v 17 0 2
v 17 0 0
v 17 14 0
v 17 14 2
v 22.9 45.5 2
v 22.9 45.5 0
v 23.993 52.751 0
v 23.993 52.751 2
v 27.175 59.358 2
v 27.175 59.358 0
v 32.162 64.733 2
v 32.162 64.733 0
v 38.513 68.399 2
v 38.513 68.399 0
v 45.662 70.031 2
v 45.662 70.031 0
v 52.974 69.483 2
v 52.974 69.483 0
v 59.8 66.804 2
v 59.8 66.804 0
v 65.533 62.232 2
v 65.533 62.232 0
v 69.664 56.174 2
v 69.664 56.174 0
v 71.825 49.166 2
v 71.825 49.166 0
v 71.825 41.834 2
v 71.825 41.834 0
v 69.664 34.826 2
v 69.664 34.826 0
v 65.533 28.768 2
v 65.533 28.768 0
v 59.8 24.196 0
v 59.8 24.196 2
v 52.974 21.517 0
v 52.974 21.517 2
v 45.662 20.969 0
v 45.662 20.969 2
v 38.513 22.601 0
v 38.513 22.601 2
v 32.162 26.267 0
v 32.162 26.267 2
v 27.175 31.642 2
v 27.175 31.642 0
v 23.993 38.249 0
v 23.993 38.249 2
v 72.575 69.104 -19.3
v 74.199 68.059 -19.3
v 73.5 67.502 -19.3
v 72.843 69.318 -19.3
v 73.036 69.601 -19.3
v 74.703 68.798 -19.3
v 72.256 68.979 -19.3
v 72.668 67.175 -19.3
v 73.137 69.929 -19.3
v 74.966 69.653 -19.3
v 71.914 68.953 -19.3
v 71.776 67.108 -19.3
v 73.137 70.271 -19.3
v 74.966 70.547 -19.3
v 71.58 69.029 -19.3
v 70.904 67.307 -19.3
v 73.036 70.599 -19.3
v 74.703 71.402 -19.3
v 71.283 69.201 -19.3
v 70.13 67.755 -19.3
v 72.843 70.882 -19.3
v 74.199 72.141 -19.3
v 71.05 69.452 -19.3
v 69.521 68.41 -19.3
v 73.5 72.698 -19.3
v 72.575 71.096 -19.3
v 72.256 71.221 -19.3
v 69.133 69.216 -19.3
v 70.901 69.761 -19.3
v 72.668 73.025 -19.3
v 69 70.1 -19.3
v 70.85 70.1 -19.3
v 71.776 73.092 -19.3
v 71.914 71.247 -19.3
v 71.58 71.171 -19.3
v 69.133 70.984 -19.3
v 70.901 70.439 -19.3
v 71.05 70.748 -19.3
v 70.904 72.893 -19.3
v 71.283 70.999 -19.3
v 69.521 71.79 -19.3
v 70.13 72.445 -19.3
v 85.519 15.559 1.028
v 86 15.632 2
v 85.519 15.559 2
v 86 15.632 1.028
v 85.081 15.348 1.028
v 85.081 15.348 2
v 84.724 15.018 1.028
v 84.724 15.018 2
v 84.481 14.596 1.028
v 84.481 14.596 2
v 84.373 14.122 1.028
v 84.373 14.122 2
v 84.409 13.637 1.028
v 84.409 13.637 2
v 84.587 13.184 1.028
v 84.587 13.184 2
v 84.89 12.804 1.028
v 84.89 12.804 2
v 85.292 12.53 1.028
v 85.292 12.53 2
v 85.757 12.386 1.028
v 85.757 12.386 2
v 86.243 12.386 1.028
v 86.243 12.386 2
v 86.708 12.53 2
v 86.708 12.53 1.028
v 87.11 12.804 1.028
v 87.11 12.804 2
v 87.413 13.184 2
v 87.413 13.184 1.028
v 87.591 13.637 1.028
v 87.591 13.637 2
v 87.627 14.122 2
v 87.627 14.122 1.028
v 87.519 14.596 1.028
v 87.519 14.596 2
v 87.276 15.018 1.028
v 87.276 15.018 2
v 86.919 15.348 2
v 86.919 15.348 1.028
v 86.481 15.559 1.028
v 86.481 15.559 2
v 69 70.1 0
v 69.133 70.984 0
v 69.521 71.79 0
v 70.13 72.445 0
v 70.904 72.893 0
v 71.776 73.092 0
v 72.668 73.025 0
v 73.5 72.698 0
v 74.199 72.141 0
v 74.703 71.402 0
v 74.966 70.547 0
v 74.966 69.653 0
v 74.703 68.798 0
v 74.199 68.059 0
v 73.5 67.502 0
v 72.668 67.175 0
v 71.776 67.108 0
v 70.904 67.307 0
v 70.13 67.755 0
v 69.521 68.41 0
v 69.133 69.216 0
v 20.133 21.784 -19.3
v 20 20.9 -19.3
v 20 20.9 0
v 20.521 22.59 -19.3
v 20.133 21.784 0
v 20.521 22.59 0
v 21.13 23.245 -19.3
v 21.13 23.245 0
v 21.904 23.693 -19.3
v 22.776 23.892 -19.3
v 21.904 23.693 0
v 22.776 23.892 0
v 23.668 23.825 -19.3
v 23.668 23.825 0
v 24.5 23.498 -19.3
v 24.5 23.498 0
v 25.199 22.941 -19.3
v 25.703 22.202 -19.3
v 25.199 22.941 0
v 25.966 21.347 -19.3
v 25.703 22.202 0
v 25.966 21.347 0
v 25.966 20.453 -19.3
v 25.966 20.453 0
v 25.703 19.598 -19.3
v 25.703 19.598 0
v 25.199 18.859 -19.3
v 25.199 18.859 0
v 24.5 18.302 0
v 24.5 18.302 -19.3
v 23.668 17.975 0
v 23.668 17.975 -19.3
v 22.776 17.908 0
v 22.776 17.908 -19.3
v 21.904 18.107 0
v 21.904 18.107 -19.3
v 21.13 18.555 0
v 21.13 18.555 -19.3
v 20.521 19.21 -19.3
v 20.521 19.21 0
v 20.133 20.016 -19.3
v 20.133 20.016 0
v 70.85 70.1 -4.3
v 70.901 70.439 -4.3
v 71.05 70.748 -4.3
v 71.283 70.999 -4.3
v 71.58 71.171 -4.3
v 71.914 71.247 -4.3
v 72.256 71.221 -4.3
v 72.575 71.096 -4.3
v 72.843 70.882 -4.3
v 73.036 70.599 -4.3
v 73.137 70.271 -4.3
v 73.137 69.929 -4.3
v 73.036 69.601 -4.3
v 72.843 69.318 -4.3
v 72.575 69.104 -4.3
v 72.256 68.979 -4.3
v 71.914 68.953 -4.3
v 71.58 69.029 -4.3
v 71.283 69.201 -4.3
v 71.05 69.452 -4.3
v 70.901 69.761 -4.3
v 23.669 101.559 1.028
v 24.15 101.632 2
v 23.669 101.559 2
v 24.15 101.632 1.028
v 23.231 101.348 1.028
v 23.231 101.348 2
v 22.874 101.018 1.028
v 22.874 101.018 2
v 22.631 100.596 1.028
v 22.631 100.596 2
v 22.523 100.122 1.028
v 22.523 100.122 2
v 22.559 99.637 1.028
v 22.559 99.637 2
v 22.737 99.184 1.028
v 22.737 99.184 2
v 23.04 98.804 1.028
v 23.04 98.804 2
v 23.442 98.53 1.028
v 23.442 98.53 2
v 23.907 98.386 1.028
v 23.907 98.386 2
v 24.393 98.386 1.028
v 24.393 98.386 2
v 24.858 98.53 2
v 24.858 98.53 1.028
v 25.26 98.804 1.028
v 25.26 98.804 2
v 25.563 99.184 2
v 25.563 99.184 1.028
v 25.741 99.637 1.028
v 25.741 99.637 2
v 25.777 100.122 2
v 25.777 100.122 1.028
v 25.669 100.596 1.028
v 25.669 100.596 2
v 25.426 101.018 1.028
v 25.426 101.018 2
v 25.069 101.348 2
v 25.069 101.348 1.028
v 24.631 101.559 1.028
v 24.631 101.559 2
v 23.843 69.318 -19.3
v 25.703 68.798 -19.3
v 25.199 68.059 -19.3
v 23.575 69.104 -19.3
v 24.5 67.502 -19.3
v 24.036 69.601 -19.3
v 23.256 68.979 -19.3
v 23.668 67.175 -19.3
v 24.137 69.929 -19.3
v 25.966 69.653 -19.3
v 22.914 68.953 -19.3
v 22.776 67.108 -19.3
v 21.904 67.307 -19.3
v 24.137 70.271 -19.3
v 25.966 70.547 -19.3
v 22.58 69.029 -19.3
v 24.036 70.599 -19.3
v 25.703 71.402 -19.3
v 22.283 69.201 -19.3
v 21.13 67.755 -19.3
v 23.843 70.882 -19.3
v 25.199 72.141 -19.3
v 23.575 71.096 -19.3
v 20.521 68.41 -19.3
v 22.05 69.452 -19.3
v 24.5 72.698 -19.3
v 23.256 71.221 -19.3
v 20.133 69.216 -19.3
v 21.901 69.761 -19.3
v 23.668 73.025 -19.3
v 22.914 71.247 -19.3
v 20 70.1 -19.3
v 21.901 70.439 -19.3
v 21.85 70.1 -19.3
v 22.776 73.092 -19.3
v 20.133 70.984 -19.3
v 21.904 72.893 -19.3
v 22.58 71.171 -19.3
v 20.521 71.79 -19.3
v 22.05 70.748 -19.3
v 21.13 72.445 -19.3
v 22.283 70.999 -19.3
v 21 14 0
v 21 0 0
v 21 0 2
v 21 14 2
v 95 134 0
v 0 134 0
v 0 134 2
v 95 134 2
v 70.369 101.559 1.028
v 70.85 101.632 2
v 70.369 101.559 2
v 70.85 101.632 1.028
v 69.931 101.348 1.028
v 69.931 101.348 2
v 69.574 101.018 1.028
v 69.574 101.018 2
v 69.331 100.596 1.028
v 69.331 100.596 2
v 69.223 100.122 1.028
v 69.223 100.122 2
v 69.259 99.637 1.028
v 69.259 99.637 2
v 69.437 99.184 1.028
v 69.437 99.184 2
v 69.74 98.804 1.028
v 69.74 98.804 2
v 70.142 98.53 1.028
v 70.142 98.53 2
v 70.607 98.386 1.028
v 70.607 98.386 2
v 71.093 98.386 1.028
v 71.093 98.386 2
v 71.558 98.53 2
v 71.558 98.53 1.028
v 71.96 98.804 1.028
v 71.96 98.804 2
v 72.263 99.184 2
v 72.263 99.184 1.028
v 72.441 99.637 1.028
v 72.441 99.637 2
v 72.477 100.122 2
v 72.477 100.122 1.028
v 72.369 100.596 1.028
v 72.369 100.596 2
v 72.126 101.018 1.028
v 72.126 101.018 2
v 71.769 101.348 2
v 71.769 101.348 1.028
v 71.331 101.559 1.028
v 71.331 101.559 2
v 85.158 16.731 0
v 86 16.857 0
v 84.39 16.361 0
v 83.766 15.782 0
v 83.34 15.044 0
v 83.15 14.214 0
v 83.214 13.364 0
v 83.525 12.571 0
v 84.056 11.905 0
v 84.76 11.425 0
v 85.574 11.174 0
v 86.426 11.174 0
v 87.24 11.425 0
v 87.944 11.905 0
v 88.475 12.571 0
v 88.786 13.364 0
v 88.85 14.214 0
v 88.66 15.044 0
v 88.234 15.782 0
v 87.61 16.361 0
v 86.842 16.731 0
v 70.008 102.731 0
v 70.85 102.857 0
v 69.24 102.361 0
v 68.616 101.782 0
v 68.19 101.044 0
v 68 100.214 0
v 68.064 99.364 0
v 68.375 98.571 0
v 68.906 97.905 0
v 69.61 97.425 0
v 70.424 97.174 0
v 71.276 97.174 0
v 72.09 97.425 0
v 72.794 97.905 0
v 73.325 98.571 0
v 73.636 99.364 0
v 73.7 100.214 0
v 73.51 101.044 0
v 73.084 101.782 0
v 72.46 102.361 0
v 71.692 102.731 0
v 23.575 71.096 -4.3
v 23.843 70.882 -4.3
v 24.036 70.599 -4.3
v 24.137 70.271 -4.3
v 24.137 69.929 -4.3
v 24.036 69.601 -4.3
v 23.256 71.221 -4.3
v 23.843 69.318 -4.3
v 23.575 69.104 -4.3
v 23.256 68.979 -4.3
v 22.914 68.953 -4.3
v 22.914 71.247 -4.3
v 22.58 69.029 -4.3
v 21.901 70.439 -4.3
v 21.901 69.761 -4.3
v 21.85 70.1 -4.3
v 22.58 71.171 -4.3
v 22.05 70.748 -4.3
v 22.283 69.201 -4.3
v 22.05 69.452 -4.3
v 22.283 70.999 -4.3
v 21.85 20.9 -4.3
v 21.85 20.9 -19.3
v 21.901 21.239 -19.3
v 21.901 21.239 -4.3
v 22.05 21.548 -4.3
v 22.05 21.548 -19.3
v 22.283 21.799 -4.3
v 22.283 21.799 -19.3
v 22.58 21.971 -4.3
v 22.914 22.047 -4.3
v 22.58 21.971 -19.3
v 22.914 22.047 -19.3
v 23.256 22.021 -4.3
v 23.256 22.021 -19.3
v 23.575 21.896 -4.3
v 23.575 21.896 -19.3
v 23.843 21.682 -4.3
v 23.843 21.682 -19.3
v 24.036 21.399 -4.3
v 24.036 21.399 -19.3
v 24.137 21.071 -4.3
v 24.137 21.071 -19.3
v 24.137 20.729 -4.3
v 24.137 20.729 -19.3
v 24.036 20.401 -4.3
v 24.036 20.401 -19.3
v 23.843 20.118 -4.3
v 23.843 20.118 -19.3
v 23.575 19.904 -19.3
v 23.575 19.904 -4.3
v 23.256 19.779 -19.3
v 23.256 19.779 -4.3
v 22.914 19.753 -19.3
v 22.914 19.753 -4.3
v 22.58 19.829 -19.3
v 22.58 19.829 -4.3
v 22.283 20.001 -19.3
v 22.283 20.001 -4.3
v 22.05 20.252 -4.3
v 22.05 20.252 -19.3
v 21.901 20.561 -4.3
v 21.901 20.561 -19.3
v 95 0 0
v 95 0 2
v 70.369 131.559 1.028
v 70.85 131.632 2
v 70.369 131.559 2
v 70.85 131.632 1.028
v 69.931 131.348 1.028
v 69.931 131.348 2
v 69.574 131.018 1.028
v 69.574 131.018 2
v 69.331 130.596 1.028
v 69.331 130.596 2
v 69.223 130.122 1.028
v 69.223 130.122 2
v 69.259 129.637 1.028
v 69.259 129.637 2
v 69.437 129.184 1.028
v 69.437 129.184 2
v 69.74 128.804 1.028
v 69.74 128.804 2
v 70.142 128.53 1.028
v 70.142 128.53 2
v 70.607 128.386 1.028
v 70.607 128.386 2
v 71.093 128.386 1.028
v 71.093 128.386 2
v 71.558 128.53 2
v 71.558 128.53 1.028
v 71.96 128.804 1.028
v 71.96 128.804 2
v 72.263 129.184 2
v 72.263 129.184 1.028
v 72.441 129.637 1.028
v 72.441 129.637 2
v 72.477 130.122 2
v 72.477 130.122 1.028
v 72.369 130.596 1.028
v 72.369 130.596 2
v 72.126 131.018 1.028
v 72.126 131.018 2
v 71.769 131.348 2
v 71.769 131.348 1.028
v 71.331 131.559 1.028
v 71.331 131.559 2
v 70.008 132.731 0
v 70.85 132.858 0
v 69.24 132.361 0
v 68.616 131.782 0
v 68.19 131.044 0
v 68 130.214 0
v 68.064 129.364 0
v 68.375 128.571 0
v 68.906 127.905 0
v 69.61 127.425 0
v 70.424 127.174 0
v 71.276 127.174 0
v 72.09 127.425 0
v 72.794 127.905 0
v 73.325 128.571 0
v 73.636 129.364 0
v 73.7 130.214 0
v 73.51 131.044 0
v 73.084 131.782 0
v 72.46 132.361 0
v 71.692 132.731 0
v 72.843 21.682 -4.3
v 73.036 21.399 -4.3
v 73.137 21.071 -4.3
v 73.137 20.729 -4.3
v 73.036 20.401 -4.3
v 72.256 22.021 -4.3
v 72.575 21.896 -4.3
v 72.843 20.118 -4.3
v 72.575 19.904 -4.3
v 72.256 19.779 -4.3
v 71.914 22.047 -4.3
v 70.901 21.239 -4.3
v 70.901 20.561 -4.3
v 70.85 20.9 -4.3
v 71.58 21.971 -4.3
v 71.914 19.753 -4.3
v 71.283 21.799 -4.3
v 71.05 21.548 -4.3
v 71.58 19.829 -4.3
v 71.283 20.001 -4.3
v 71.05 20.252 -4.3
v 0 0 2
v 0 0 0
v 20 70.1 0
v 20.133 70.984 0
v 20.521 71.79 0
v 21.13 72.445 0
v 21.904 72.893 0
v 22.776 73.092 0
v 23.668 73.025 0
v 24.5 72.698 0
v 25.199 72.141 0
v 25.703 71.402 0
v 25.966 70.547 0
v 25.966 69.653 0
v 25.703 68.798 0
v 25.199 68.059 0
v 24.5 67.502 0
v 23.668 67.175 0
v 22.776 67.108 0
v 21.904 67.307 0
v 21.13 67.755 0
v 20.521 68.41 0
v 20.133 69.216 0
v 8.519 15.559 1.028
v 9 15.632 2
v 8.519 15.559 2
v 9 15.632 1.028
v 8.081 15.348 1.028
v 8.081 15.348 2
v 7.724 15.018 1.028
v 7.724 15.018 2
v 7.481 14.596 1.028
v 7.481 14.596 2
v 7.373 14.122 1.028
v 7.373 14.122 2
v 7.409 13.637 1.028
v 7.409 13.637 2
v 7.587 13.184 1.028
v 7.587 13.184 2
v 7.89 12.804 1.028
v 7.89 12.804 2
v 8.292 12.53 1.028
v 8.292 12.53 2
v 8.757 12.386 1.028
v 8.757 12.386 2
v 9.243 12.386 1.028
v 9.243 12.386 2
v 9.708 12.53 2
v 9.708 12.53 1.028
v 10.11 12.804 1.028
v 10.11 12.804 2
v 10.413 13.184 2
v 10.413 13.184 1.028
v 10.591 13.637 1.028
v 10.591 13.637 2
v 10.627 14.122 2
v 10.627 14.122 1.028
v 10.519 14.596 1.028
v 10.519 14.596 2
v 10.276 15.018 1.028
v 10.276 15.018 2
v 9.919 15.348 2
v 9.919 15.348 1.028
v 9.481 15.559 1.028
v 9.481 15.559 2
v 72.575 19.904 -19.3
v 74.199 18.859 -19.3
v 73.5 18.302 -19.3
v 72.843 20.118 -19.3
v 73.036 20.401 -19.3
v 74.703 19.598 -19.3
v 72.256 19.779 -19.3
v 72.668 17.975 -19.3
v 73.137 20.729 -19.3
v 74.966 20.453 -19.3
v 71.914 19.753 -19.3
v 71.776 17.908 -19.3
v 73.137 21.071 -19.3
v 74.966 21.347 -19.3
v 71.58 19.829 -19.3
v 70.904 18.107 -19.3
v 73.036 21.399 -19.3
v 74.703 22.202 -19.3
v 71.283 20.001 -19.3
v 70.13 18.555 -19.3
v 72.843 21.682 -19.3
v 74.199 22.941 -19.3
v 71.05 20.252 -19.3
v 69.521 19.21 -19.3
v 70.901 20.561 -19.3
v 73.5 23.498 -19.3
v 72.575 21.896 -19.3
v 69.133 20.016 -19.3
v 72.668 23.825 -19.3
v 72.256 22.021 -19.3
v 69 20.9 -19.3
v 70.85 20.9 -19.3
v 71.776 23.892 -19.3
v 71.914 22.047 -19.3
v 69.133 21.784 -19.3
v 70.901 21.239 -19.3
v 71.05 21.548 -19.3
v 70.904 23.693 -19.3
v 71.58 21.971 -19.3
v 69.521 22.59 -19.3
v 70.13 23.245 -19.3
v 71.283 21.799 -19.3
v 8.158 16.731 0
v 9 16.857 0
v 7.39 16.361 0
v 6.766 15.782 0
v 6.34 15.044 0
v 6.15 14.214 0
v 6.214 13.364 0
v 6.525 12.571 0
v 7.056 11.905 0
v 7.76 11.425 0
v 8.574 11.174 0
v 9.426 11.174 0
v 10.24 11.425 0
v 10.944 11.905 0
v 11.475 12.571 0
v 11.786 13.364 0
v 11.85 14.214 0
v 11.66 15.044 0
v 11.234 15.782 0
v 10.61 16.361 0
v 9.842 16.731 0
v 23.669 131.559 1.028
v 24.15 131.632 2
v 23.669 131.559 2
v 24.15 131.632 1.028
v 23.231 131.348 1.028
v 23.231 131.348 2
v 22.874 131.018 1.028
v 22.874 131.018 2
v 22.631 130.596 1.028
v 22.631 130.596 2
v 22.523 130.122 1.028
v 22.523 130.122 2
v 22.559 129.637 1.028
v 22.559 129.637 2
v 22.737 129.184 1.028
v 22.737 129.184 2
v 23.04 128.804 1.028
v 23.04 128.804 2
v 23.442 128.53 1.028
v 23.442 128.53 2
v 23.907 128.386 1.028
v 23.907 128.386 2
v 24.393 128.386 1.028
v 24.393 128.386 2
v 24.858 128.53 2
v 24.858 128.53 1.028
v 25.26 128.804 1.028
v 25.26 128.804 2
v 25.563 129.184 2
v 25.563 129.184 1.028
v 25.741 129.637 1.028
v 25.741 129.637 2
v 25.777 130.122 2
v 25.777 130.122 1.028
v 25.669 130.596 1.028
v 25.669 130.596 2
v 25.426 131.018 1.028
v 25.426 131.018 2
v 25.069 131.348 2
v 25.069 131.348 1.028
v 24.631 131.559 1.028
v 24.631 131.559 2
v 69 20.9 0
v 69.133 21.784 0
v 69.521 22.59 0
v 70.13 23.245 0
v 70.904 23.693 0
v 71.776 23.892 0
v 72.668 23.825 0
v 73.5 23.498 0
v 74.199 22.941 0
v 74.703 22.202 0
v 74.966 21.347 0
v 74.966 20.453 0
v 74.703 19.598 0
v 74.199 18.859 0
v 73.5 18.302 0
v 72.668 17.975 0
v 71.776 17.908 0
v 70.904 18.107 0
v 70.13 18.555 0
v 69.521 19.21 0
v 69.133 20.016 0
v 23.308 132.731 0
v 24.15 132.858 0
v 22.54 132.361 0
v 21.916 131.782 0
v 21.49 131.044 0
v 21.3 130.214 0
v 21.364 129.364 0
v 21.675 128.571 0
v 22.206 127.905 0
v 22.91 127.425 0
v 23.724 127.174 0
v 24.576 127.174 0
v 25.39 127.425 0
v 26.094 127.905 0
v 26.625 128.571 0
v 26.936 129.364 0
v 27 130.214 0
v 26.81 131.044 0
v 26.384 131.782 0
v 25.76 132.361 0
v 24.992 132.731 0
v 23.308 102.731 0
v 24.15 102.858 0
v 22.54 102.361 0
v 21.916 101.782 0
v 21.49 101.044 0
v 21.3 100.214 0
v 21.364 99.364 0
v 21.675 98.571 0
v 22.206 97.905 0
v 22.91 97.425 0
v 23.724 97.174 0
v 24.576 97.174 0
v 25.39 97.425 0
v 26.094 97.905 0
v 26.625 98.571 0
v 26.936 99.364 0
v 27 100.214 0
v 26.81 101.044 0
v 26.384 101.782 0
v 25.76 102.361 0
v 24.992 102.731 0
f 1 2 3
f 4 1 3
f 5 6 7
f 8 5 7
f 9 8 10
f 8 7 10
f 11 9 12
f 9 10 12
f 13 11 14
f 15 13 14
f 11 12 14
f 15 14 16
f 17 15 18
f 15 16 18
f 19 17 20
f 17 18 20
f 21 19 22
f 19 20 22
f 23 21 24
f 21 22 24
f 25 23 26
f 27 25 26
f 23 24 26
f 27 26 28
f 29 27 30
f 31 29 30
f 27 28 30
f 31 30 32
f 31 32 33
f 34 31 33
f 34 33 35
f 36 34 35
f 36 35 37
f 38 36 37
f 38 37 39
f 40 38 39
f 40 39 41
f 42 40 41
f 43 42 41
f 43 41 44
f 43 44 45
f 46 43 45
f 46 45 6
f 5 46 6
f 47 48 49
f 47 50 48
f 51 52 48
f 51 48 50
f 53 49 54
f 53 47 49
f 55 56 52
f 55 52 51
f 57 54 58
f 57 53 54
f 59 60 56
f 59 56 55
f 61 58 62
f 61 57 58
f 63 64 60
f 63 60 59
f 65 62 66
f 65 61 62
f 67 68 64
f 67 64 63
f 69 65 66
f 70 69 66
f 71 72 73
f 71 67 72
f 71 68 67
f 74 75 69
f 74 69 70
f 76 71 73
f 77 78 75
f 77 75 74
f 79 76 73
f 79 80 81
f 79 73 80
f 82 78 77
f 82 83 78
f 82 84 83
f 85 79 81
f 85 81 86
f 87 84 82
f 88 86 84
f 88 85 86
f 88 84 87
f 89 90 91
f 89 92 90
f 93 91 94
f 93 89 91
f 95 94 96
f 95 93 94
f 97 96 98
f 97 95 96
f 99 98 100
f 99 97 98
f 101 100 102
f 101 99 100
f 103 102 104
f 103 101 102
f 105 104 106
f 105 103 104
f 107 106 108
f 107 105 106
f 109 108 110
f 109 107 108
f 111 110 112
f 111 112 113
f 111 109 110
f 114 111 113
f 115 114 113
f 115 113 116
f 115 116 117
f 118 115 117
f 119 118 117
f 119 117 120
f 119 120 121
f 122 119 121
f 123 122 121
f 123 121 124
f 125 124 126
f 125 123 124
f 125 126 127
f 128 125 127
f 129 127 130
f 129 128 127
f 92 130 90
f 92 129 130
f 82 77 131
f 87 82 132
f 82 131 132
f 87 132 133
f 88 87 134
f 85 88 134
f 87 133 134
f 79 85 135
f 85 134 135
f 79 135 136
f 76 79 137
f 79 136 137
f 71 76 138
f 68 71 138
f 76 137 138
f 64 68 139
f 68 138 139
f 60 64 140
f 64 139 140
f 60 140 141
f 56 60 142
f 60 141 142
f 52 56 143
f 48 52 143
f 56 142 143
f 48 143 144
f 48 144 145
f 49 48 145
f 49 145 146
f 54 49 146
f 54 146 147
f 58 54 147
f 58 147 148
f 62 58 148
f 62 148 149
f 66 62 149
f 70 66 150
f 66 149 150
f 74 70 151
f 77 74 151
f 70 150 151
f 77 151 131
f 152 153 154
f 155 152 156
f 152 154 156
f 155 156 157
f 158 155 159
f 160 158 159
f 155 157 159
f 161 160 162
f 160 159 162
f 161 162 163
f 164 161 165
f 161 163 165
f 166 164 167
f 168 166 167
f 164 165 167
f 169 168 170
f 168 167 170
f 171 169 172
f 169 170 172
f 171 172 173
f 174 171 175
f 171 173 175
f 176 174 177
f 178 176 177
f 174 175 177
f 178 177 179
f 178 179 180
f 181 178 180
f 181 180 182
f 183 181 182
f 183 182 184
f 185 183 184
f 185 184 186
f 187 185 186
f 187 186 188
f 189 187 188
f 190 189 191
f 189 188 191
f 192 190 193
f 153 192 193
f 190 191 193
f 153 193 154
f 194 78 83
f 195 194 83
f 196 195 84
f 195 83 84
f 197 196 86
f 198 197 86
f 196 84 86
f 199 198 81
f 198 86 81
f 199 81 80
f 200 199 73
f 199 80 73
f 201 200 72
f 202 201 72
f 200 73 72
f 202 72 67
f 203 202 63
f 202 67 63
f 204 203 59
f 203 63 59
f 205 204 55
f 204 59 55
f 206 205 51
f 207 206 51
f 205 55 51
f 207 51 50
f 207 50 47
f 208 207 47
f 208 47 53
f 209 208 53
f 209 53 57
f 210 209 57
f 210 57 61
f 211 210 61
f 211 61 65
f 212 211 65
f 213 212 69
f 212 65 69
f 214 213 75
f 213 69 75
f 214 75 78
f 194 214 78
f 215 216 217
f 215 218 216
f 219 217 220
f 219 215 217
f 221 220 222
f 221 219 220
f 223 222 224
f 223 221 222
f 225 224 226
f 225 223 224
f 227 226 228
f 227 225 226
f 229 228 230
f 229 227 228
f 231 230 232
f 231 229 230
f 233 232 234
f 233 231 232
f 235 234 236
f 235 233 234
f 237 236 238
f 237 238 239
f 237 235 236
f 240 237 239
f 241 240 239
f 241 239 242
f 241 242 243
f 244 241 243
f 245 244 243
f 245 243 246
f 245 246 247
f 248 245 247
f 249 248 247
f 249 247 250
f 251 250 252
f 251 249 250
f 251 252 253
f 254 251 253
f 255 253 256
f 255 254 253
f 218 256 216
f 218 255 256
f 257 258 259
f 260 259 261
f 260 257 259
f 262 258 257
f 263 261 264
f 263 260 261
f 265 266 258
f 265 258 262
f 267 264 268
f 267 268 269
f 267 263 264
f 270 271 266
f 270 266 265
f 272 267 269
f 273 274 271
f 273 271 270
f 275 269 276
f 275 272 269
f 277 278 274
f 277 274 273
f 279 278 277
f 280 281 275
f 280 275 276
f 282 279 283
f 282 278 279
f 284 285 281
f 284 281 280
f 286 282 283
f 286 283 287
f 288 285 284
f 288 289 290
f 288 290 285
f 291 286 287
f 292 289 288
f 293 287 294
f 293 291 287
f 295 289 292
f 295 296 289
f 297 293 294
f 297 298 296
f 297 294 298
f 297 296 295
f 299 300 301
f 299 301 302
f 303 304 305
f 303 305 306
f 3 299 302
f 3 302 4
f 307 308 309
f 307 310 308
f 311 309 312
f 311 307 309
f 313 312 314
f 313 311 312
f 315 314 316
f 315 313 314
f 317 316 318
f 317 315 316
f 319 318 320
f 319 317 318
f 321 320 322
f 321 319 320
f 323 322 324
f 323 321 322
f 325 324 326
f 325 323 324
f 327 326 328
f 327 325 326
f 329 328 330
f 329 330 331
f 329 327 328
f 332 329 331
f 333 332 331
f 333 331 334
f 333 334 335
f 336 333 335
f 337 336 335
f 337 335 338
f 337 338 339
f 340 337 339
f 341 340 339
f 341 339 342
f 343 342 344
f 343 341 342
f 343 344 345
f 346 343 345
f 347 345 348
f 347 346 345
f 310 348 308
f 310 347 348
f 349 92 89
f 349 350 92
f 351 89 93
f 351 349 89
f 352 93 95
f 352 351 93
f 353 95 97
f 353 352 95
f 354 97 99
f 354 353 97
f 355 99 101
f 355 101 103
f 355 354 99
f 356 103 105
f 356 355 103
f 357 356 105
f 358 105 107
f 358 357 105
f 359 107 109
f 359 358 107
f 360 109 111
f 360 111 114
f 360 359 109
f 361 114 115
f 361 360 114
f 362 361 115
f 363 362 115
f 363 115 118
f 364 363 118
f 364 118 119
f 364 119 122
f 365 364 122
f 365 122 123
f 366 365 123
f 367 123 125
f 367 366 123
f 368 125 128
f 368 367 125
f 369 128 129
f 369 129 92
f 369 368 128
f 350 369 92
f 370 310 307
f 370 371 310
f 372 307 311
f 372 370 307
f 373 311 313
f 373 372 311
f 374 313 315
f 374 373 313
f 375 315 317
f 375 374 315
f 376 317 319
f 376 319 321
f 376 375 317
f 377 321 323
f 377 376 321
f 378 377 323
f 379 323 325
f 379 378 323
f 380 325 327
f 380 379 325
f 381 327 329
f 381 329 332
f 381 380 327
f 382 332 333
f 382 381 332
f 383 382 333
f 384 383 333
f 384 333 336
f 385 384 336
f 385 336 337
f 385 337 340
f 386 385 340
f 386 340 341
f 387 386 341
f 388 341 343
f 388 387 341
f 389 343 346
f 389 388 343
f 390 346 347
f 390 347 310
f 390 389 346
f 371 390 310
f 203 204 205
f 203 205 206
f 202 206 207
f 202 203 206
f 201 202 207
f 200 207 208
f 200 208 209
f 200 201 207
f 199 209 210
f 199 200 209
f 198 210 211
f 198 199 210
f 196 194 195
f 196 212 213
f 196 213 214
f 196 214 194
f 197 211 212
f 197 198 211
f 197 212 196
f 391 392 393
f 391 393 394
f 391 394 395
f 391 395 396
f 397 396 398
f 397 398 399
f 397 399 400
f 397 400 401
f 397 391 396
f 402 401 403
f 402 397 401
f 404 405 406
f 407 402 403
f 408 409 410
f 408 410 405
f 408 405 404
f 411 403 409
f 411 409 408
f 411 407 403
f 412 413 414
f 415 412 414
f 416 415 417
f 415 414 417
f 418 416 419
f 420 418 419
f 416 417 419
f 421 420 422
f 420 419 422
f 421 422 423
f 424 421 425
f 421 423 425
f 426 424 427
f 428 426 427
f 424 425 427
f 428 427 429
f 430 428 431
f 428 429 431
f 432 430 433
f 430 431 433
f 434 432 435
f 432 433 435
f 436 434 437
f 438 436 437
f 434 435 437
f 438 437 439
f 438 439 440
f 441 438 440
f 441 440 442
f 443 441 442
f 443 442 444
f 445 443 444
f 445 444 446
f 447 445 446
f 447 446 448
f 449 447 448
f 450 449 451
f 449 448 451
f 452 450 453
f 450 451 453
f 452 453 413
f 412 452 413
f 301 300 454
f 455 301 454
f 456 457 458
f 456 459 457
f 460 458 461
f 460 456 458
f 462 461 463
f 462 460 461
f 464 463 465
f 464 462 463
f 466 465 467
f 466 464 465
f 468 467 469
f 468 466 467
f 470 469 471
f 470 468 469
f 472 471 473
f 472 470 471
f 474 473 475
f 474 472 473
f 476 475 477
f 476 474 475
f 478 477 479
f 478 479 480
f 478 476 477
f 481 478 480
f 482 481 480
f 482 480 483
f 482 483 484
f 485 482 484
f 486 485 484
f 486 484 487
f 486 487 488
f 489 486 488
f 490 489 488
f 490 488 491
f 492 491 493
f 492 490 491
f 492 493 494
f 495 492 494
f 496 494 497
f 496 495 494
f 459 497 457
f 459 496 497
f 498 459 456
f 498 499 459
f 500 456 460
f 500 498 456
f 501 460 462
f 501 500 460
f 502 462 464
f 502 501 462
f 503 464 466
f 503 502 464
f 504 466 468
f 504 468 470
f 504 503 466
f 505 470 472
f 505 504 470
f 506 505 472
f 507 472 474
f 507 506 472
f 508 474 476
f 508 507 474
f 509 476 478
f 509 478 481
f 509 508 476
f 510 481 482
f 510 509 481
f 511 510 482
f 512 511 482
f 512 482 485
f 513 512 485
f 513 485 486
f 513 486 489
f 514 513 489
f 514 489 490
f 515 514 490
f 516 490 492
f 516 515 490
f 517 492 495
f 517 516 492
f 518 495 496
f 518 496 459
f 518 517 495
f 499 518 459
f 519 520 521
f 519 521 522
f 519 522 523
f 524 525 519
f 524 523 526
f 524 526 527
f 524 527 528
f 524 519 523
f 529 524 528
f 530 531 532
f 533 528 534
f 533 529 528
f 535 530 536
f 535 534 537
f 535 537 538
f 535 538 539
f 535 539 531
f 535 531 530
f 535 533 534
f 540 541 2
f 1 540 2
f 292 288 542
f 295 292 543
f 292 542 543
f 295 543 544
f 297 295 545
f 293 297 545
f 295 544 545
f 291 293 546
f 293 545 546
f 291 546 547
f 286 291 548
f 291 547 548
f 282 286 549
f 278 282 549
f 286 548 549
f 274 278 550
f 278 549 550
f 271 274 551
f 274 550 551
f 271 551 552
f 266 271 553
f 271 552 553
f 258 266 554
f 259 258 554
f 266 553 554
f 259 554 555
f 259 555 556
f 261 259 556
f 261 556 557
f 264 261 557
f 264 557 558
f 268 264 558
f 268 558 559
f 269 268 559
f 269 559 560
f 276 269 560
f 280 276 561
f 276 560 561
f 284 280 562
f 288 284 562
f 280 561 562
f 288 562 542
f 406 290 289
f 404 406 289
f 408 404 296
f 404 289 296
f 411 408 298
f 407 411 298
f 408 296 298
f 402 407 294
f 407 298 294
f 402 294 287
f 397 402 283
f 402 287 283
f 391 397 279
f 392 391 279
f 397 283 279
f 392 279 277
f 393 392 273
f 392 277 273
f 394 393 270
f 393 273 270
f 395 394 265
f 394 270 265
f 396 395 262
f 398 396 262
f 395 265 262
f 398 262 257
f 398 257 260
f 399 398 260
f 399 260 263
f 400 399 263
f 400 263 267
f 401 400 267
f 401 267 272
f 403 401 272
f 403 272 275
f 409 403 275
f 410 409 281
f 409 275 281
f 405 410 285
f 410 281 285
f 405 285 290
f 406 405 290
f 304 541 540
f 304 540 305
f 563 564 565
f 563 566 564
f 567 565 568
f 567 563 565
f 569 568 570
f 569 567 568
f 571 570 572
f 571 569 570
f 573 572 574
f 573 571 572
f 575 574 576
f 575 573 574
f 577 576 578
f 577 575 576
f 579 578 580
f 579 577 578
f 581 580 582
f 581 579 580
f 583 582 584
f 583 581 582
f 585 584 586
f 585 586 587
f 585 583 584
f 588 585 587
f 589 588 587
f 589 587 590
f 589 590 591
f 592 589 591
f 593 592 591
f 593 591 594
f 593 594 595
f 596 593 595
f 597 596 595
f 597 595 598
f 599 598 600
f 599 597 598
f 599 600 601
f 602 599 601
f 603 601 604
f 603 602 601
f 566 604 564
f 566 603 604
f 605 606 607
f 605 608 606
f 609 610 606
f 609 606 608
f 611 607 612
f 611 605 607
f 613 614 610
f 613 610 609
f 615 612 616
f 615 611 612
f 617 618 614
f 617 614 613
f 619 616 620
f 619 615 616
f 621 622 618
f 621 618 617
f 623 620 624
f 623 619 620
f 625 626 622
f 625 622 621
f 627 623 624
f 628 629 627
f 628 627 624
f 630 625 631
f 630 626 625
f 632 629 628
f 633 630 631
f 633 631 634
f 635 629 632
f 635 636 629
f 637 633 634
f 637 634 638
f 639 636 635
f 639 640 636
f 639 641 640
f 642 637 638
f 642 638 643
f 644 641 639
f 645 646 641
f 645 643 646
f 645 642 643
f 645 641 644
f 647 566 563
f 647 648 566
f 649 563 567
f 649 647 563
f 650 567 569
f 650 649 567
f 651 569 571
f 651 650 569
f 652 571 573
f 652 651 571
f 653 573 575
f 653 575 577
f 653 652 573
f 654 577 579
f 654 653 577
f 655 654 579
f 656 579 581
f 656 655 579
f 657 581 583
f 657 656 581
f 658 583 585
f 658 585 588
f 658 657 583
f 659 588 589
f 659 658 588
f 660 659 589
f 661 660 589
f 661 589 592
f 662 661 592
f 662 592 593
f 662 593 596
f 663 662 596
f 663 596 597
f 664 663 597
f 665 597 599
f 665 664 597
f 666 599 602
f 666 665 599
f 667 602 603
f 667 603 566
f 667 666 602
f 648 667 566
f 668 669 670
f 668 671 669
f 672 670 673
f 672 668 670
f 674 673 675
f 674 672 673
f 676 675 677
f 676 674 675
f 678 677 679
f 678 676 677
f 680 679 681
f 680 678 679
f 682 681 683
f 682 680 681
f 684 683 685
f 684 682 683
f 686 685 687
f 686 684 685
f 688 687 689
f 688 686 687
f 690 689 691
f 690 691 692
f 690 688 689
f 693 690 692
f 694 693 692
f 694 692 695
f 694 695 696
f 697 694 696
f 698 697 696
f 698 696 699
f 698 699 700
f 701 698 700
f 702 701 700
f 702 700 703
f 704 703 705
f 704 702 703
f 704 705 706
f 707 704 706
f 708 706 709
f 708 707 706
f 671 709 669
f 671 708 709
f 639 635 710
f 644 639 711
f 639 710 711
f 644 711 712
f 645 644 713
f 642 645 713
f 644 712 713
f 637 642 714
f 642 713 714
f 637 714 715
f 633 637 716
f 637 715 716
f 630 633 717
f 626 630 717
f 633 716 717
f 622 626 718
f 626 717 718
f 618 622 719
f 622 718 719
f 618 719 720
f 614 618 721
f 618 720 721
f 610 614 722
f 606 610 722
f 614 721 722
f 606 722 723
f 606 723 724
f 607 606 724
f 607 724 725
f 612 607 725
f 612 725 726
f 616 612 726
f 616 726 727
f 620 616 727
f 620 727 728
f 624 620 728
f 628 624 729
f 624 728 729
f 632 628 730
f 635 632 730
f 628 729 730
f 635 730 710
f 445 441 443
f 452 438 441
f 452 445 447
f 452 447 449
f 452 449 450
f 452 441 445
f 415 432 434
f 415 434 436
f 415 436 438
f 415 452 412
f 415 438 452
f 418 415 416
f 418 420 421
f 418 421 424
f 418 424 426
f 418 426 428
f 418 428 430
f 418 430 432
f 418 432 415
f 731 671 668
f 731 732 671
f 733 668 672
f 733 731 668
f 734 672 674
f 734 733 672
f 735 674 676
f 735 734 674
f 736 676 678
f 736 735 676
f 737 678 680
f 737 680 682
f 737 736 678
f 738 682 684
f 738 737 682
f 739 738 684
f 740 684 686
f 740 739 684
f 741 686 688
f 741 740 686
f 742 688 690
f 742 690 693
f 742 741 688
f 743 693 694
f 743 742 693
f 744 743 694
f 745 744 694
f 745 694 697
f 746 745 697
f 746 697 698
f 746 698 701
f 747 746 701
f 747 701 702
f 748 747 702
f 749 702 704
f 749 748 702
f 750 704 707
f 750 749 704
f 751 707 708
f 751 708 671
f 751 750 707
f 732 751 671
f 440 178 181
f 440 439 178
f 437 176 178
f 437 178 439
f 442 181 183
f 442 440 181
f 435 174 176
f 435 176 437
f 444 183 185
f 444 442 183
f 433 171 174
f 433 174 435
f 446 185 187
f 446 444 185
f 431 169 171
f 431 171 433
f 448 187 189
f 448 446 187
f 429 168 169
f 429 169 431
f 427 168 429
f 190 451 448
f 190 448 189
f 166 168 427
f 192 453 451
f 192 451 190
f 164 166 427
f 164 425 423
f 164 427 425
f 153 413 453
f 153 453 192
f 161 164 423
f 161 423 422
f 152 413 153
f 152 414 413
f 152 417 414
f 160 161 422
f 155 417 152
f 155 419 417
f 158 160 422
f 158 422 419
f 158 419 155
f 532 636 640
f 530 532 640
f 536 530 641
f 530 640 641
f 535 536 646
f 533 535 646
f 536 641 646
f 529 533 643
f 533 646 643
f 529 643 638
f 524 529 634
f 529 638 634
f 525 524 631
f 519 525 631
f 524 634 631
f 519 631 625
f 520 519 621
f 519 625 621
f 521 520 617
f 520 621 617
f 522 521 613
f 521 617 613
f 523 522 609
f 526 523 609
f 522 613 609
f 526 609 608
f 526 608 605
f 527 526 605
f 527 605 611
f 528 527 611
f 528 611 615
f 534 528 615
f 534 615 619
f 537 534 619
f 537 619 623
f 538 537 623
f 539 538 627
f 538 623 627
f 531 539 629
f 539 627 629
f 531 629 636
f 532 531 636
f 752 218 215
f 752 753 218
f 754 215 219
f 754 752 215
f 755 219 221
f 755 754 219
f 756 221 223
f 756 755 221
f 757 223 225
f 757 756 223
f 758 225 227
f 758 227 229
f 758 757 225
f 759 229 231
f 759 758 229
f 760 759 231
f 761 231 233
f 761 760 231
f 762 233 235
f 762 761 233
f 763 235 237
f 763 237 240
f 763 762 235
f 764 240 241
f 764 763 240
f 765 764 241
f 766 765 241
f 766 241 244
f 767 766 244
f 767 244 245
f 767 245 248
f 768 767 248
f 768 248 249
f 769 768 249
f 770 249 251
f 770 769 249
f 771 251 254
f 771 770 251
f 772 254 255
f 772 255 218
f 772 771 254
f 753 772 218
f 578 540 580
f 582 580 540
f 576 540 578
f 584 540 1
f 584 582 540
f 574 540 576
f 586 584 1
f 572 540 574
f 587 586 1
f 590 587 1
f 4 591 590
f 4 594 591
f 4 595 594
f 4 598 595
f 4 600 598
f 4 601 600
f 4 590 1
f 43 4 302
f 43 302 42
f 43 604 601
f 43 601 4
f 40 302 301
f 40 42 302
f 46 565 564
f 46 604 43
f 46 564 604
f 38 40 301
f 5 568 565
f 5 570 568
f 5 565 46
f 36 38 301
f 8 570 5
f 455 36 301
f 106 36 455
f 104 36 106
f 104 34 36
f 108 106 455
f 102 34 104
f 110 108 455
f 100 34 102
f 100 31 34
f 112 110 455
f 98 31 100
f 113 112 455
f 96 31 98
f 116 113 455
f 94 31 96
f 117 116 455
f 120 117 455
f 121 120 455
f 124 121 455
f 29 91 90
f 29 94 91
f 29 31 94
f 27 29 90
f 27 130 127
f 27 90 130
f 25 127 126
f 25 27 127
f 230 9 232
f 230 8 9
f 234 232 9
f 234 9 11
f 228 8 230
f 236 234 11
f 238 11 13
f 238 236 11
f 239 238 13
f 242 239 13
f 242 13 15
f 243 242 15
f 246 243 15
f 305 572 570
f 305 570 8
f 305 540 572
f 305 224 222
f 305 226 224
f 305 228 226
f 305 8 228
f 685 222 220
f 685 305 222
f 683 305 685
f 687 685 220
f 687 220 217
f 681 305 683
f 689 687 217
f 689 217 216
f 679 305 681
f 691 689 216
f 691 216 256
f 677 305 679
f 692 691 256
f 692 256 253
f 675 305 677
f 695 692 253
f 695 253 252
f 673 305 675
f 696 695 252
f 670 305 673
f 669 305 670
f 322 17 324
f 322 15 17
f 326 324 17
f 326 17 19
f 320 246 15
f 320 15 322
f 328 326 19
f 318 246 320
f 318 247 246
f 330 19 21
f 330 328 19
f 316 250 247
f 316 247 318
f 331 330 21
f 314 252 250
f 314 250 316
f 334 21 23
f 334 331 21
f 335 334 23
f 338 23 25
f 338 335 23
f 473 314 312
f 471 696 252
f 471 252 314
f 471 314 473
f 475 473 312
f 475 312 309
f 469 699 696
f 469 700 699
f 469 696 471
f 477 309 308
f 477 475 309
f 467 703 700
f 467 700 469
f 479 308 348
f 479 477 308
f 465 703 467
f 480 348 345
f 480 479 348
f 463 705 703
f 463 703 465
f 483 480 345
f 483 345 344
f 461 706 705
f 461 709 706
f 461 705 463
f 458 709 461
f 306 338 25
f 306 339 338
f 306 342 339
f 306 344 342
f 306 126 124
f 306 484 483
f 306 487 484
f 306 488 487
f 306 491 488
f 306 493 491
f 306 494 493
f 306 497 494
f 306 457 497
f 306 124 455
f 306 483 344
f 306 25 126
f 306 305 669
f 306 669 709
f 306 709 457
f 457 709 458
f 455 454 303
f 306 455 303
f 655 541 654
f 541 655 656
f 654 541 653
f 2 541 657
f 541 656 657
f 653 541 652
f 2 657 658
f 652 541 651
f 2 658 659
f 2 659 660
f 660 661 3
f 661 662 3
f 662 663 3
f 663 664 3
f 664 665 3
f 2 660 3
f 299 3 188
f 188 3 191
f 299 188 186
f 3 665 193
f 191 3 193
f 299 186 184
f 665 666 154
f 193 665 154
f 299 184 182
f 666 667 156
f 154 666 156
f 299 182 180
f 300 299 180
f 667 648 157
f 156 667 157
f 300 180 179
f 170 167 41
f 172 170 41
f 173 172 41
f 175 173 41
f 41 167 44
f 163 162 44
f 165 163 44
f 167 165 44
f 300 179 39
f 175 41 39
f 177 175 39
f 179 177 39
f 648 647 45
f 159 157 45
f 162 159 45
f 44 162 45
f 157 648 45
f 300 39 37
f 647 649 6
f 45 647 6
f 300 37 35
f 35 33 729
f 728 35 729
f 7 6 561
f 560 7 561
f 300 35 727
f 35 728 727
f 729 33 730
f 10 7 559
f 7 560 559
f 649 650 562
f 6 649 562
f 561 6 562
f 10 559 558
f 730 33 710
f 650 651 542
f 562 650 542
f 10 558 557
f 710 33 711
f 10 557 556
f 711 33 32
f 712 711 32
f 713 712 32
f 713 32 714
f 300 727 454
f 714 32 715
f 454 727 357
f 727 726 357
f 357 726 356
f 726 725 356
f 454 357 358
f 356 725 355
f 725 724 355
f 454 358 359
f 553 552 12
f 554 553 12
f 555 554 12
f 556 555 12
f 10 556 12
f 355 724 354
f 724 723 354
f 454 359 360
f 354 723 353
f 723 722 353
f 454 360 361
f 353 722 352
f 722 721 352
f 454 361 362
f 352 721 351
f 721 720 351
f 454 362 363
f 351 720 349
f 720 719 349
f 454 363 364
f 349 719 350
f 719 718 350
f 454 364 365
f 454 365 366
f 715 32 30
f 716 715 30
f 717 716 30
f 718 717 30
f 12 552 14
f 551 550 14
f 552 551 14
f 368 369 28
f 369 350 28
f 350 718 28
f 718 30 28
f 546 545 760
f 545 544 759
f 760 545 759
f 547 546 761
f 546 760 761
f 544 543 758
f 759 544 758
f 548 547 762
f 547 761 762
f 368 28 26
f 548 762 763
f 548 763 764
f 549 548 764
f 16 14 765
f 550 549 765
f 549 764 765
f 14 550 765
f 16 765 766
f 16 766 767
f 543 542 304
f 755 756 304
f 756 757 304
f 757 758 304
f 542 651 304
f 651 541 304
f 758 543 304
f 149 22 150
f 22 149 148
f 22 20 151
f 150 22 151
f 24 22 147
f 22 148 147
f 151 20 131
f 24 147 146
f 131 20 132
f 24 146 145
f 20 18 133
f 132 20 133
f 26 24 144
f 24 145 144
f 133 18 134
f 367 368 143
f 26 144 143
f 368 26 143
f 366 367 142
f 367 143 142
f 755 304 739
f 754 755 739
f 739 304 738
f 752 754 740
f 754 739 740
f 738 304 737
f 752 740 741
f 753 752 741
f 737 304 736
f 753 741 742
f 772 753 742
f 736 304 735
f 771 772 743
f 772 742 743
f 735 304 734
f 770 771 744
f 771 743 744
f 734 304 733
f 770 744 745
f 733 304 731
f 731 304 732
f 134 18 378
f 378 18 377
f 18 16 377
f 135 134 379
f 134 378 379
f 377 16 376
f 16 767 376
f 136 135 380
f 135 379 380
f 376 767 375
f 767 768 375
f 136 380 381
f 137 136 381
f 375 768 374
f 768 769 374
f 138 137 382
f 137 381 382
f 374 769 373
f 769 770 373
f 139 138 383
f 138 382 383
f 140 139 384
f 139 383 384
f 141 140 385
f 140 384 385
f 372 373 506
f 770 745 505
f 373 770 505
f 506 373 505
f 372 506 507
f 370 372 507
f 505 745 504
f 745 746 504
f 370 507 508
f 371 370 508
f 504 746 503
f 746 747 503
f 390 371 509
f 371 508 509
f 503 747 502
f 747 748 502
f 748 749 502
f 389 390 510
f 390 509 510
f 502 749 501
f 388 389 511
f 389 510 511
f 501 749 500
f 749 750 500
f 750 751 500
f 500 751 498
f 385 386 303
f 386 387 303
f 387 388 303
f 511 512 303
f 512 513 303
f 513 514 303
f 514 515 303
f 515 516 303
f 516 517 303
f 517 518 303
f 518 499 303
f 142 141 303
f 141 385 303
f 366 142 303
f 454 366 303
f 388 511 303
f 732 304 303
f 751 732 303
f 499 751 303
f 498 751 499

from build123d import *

# Parameters (mm, degrees)
SKETCH1_W                                 = 95
SKETCH1_H                                 = 134
BOSS_EXTRUDE1_DEPTH                       = 2
CSK_FOR_4_FLAT_HEAD_MACHINE_SCREW_2_COUNT = 2
CSK_FOR_4_FLAT_HEAD_MACHINE_SCREW_2_PITCH = 46.7
CSK_FOR_4_FLAT_HEAD_MACHINE_SCREW_3_COUNT = 2
CSK_FOR_4_FLAT_HEAD_MACHINE_SCREW_3_PITCH = 55.505765466
CSK_FOR_4_FLAT_HEAD_MACHINE_SCREW_4_COUNT = 2
CSK_FOR_4_FLAT_HEAD_MACHINE_SCREW_4_PITCH = 30
CSK_FOR_4_FLAT_HEAD_MACHINE_SCREW_5_COUNT = 2
CSK_FOR_4_FLAT_HEAD_MACHINE_SCREW_5_PITCH = 116.985137945
CSK_FOR_4_FLAT_HEAD_MACHINE_SCREW_6_COUNT = 2
CSK_FOR_4_FLAT_HEAD_MACHINE_SCREW_6_PITCH = 131.458824352
SKETCH13_R                                = 24.6
CUT_EXTRUDE2_DEPTH                        = 165.271117364
SKETCH14_R                                = 3
BOSS_EXTRUDE4_DEPTH                       = 19.3
SKETCH15_R                                = 1.15
CUT_EXTRUDE3_DEPTH                        = 15
SKETCH16_W                                = 4
SKETCH16_H                                = 14
CUT_EXTRUDE4_DEPTH                        = 166.388905311


with BuildPart() as part:
    # Sketch1 → Boss-Extrude1 (new body)
    with BuildSketch(Plane.XY):
        with Locations((47.5, 67)):
            Rectangle(SKETCH1_W, SKETCH1_H)
    extrude(amount=BOSS_EXTRUDE1_DEPTH)

    # Sketch8 → CSK for #4 Flat Head Machine Screw (100)2 (revolve, cut)
    with BuildSketch(Plane(origin=(70.85, 130, 0), x_dir=(0, 1, 0), z_dir=(1, 0, 0))):
        Polygon((0, 0), (0, 2), (1.63195, 2), (1.63195, 1.028358553), (2.8575, 0), align=None)
    csk_for_4_flat_head_machine_screw_100 = revolve(axis=Axis((70.85, 130, -6.35), (0, 0, 1)), mode=Mode.SUBTRACT)

    # CSK for _4 Flat Head Machine Screw _ 2: CSK for #4 Flat Head Machine Screw (100)2 ×2
    with Locations(*[(-i * CSK_FOR_4_FLAT_HEAD_MACHINE_SCREW_2_PITCH, 0, 0) for i in range(1, CSK_FOR_4_FLAT_HEAD_MACHINE_SCREW_2_COUNT)]):
        add(csk_for_4_flat_head_machine_screw_100, mode=Mode.SUBTRACT)

    # CSK for _4 Flat Head Machine Screw _ 3: CSK for #4 Flat Head Machine Screw (100)2 ×2
    with Locations(*[Vector(-0.8413540396691381, -0.540484393791738, 0) * (i * CSK_FOR_4_FLAT_HEAD_MACHINE_SCREW_3_PITCH) for i in range(1, CSK_FOR_4_FLAT_HEAD_MACHINE_SCREW_3_COUNT)]):
        add(csk_for_4_flat_head_machine_screw_100, mode=Mode.SUBTRACT)

    # CSK for _4 Flat Head Machine Screw _ 4: CSK for #4 Flat Head Machine Screw (100)2 ×2
    with Locations(*[(0, -i * CSK_FOR_4_FLAT_HEAD_MACHINE_SCREW_4_PITCH, 0) for i in range(1, CSK_FOR_4_FLAT_HEAD_MACHINE_SCREW_4_COUNT)]):
        add(csk_for_4_flat_head_machine_screw_100, mode=Mode.SUBTRACT)

    # CSK for _4 Flat Head Machine Screw _ 5: CSK for #4 Flat Head Machine Screw (100)2 ×2
    with Locations(*[Vector(0.12950362982970207, -0.991578947870986, 0) * (i * CSK_FOR_4_FLAT_HEAD_MACHINE_SCREW_5_PITCH) for i in range(1, CSK_FOR_4_FLAT_HEAD_MACHINE_SCREW_5_COUNT)]):
        add(csk_for_4_flat_head_machine_screw_100, mode=Mode.SUBTRACT)

    # CSK for _4 Flat Head Machine Screw _ 6: CSK for #4 Flat Head Machine Screw (100)2 ×2
    with Locations(*[Vector(-0.47048952632046626, -0.8824055788710445, 0) * (i * CSK_FOR_4_FLAT_HEAD_MACHINE_SCREW_6_PITCH) for i in range(1, CSK_FOR_4_FLAT_HEAD_MACHINE_SCREW_6_COUNT)]):
        add(csk_for_4_flat_head_machine_screw_100, mode=Mode.SUBTRACT)

    # Sketch13 → Cut-Extrude2 (cut, through all)
    with BuildSketch(Plane(origin=(0, 0, 0), x_dir=(-1, 0, 0), z_dir=(0, 0, -1))):
        with Locations((-47.5, 45.5)):
            Circle(SKETCH13_R)
    extrude(amount=-CUT_EXTRUDE2_DEPTH, mode=Mode.SUBTRACT)

    # Sketch14 → Boss-Extrude4 (add)
    with BuildSketch(Plane(origin=(0, 0, 0), x_dir=(-1, 0, 0), z_dir=(0, 0, -1))):
        with Locations((-72, 70.1)):
            Circle(SKETCH14_R)
        with Locations((-23, 70.1)):
            Circle(SKETCH14_R)
        with Locations((-72, 20.9)):
            Circle(SKETCH14_R)
        with Locations((-23, 20.9)):
            Circle(SKETCH14_R)
    extrude(amount=BOSS_EXTRUDE4_DEPTH)

    # Sketch15 → Cut-Extrude3 (cut)
    with BuildSketch(Plane(origin=(0, 0, -19.3), x_dir=(-1, 0, 0), z_dir=(0, 0, -1))):
        with Locations((-72, 70.1)):
            Circle(SKETCH15_R)
        with Locations((-23, 70.1)):
            Circle(SKETCH15_R)
        with Locations((-23, 20.9)):
            Circle(SKETCH15_R)
        with Locations((-72, 20.9)):
            Circle(SKETCH15_R)
    extrude(amount=-CUT_EXTRUDE3_DEPTH, mode=Mode.SUBTRACT)

    # Sketch16 → Cut-Extrude4 (cut, through all)
    with BuildSketch(Plane(origin=(0, 0, 0), x_dir=(-1, 0, 0), z_dir=(0, 0, -1))):
        with Locations((-19, 7)):
            Rectangle(SKETCH16_W, SKETCH16_H)
    extrude(amount=-CUT_EXTRUDE4_DEPTH, mode=Mode.SUBTRACT)


solid = part.part
